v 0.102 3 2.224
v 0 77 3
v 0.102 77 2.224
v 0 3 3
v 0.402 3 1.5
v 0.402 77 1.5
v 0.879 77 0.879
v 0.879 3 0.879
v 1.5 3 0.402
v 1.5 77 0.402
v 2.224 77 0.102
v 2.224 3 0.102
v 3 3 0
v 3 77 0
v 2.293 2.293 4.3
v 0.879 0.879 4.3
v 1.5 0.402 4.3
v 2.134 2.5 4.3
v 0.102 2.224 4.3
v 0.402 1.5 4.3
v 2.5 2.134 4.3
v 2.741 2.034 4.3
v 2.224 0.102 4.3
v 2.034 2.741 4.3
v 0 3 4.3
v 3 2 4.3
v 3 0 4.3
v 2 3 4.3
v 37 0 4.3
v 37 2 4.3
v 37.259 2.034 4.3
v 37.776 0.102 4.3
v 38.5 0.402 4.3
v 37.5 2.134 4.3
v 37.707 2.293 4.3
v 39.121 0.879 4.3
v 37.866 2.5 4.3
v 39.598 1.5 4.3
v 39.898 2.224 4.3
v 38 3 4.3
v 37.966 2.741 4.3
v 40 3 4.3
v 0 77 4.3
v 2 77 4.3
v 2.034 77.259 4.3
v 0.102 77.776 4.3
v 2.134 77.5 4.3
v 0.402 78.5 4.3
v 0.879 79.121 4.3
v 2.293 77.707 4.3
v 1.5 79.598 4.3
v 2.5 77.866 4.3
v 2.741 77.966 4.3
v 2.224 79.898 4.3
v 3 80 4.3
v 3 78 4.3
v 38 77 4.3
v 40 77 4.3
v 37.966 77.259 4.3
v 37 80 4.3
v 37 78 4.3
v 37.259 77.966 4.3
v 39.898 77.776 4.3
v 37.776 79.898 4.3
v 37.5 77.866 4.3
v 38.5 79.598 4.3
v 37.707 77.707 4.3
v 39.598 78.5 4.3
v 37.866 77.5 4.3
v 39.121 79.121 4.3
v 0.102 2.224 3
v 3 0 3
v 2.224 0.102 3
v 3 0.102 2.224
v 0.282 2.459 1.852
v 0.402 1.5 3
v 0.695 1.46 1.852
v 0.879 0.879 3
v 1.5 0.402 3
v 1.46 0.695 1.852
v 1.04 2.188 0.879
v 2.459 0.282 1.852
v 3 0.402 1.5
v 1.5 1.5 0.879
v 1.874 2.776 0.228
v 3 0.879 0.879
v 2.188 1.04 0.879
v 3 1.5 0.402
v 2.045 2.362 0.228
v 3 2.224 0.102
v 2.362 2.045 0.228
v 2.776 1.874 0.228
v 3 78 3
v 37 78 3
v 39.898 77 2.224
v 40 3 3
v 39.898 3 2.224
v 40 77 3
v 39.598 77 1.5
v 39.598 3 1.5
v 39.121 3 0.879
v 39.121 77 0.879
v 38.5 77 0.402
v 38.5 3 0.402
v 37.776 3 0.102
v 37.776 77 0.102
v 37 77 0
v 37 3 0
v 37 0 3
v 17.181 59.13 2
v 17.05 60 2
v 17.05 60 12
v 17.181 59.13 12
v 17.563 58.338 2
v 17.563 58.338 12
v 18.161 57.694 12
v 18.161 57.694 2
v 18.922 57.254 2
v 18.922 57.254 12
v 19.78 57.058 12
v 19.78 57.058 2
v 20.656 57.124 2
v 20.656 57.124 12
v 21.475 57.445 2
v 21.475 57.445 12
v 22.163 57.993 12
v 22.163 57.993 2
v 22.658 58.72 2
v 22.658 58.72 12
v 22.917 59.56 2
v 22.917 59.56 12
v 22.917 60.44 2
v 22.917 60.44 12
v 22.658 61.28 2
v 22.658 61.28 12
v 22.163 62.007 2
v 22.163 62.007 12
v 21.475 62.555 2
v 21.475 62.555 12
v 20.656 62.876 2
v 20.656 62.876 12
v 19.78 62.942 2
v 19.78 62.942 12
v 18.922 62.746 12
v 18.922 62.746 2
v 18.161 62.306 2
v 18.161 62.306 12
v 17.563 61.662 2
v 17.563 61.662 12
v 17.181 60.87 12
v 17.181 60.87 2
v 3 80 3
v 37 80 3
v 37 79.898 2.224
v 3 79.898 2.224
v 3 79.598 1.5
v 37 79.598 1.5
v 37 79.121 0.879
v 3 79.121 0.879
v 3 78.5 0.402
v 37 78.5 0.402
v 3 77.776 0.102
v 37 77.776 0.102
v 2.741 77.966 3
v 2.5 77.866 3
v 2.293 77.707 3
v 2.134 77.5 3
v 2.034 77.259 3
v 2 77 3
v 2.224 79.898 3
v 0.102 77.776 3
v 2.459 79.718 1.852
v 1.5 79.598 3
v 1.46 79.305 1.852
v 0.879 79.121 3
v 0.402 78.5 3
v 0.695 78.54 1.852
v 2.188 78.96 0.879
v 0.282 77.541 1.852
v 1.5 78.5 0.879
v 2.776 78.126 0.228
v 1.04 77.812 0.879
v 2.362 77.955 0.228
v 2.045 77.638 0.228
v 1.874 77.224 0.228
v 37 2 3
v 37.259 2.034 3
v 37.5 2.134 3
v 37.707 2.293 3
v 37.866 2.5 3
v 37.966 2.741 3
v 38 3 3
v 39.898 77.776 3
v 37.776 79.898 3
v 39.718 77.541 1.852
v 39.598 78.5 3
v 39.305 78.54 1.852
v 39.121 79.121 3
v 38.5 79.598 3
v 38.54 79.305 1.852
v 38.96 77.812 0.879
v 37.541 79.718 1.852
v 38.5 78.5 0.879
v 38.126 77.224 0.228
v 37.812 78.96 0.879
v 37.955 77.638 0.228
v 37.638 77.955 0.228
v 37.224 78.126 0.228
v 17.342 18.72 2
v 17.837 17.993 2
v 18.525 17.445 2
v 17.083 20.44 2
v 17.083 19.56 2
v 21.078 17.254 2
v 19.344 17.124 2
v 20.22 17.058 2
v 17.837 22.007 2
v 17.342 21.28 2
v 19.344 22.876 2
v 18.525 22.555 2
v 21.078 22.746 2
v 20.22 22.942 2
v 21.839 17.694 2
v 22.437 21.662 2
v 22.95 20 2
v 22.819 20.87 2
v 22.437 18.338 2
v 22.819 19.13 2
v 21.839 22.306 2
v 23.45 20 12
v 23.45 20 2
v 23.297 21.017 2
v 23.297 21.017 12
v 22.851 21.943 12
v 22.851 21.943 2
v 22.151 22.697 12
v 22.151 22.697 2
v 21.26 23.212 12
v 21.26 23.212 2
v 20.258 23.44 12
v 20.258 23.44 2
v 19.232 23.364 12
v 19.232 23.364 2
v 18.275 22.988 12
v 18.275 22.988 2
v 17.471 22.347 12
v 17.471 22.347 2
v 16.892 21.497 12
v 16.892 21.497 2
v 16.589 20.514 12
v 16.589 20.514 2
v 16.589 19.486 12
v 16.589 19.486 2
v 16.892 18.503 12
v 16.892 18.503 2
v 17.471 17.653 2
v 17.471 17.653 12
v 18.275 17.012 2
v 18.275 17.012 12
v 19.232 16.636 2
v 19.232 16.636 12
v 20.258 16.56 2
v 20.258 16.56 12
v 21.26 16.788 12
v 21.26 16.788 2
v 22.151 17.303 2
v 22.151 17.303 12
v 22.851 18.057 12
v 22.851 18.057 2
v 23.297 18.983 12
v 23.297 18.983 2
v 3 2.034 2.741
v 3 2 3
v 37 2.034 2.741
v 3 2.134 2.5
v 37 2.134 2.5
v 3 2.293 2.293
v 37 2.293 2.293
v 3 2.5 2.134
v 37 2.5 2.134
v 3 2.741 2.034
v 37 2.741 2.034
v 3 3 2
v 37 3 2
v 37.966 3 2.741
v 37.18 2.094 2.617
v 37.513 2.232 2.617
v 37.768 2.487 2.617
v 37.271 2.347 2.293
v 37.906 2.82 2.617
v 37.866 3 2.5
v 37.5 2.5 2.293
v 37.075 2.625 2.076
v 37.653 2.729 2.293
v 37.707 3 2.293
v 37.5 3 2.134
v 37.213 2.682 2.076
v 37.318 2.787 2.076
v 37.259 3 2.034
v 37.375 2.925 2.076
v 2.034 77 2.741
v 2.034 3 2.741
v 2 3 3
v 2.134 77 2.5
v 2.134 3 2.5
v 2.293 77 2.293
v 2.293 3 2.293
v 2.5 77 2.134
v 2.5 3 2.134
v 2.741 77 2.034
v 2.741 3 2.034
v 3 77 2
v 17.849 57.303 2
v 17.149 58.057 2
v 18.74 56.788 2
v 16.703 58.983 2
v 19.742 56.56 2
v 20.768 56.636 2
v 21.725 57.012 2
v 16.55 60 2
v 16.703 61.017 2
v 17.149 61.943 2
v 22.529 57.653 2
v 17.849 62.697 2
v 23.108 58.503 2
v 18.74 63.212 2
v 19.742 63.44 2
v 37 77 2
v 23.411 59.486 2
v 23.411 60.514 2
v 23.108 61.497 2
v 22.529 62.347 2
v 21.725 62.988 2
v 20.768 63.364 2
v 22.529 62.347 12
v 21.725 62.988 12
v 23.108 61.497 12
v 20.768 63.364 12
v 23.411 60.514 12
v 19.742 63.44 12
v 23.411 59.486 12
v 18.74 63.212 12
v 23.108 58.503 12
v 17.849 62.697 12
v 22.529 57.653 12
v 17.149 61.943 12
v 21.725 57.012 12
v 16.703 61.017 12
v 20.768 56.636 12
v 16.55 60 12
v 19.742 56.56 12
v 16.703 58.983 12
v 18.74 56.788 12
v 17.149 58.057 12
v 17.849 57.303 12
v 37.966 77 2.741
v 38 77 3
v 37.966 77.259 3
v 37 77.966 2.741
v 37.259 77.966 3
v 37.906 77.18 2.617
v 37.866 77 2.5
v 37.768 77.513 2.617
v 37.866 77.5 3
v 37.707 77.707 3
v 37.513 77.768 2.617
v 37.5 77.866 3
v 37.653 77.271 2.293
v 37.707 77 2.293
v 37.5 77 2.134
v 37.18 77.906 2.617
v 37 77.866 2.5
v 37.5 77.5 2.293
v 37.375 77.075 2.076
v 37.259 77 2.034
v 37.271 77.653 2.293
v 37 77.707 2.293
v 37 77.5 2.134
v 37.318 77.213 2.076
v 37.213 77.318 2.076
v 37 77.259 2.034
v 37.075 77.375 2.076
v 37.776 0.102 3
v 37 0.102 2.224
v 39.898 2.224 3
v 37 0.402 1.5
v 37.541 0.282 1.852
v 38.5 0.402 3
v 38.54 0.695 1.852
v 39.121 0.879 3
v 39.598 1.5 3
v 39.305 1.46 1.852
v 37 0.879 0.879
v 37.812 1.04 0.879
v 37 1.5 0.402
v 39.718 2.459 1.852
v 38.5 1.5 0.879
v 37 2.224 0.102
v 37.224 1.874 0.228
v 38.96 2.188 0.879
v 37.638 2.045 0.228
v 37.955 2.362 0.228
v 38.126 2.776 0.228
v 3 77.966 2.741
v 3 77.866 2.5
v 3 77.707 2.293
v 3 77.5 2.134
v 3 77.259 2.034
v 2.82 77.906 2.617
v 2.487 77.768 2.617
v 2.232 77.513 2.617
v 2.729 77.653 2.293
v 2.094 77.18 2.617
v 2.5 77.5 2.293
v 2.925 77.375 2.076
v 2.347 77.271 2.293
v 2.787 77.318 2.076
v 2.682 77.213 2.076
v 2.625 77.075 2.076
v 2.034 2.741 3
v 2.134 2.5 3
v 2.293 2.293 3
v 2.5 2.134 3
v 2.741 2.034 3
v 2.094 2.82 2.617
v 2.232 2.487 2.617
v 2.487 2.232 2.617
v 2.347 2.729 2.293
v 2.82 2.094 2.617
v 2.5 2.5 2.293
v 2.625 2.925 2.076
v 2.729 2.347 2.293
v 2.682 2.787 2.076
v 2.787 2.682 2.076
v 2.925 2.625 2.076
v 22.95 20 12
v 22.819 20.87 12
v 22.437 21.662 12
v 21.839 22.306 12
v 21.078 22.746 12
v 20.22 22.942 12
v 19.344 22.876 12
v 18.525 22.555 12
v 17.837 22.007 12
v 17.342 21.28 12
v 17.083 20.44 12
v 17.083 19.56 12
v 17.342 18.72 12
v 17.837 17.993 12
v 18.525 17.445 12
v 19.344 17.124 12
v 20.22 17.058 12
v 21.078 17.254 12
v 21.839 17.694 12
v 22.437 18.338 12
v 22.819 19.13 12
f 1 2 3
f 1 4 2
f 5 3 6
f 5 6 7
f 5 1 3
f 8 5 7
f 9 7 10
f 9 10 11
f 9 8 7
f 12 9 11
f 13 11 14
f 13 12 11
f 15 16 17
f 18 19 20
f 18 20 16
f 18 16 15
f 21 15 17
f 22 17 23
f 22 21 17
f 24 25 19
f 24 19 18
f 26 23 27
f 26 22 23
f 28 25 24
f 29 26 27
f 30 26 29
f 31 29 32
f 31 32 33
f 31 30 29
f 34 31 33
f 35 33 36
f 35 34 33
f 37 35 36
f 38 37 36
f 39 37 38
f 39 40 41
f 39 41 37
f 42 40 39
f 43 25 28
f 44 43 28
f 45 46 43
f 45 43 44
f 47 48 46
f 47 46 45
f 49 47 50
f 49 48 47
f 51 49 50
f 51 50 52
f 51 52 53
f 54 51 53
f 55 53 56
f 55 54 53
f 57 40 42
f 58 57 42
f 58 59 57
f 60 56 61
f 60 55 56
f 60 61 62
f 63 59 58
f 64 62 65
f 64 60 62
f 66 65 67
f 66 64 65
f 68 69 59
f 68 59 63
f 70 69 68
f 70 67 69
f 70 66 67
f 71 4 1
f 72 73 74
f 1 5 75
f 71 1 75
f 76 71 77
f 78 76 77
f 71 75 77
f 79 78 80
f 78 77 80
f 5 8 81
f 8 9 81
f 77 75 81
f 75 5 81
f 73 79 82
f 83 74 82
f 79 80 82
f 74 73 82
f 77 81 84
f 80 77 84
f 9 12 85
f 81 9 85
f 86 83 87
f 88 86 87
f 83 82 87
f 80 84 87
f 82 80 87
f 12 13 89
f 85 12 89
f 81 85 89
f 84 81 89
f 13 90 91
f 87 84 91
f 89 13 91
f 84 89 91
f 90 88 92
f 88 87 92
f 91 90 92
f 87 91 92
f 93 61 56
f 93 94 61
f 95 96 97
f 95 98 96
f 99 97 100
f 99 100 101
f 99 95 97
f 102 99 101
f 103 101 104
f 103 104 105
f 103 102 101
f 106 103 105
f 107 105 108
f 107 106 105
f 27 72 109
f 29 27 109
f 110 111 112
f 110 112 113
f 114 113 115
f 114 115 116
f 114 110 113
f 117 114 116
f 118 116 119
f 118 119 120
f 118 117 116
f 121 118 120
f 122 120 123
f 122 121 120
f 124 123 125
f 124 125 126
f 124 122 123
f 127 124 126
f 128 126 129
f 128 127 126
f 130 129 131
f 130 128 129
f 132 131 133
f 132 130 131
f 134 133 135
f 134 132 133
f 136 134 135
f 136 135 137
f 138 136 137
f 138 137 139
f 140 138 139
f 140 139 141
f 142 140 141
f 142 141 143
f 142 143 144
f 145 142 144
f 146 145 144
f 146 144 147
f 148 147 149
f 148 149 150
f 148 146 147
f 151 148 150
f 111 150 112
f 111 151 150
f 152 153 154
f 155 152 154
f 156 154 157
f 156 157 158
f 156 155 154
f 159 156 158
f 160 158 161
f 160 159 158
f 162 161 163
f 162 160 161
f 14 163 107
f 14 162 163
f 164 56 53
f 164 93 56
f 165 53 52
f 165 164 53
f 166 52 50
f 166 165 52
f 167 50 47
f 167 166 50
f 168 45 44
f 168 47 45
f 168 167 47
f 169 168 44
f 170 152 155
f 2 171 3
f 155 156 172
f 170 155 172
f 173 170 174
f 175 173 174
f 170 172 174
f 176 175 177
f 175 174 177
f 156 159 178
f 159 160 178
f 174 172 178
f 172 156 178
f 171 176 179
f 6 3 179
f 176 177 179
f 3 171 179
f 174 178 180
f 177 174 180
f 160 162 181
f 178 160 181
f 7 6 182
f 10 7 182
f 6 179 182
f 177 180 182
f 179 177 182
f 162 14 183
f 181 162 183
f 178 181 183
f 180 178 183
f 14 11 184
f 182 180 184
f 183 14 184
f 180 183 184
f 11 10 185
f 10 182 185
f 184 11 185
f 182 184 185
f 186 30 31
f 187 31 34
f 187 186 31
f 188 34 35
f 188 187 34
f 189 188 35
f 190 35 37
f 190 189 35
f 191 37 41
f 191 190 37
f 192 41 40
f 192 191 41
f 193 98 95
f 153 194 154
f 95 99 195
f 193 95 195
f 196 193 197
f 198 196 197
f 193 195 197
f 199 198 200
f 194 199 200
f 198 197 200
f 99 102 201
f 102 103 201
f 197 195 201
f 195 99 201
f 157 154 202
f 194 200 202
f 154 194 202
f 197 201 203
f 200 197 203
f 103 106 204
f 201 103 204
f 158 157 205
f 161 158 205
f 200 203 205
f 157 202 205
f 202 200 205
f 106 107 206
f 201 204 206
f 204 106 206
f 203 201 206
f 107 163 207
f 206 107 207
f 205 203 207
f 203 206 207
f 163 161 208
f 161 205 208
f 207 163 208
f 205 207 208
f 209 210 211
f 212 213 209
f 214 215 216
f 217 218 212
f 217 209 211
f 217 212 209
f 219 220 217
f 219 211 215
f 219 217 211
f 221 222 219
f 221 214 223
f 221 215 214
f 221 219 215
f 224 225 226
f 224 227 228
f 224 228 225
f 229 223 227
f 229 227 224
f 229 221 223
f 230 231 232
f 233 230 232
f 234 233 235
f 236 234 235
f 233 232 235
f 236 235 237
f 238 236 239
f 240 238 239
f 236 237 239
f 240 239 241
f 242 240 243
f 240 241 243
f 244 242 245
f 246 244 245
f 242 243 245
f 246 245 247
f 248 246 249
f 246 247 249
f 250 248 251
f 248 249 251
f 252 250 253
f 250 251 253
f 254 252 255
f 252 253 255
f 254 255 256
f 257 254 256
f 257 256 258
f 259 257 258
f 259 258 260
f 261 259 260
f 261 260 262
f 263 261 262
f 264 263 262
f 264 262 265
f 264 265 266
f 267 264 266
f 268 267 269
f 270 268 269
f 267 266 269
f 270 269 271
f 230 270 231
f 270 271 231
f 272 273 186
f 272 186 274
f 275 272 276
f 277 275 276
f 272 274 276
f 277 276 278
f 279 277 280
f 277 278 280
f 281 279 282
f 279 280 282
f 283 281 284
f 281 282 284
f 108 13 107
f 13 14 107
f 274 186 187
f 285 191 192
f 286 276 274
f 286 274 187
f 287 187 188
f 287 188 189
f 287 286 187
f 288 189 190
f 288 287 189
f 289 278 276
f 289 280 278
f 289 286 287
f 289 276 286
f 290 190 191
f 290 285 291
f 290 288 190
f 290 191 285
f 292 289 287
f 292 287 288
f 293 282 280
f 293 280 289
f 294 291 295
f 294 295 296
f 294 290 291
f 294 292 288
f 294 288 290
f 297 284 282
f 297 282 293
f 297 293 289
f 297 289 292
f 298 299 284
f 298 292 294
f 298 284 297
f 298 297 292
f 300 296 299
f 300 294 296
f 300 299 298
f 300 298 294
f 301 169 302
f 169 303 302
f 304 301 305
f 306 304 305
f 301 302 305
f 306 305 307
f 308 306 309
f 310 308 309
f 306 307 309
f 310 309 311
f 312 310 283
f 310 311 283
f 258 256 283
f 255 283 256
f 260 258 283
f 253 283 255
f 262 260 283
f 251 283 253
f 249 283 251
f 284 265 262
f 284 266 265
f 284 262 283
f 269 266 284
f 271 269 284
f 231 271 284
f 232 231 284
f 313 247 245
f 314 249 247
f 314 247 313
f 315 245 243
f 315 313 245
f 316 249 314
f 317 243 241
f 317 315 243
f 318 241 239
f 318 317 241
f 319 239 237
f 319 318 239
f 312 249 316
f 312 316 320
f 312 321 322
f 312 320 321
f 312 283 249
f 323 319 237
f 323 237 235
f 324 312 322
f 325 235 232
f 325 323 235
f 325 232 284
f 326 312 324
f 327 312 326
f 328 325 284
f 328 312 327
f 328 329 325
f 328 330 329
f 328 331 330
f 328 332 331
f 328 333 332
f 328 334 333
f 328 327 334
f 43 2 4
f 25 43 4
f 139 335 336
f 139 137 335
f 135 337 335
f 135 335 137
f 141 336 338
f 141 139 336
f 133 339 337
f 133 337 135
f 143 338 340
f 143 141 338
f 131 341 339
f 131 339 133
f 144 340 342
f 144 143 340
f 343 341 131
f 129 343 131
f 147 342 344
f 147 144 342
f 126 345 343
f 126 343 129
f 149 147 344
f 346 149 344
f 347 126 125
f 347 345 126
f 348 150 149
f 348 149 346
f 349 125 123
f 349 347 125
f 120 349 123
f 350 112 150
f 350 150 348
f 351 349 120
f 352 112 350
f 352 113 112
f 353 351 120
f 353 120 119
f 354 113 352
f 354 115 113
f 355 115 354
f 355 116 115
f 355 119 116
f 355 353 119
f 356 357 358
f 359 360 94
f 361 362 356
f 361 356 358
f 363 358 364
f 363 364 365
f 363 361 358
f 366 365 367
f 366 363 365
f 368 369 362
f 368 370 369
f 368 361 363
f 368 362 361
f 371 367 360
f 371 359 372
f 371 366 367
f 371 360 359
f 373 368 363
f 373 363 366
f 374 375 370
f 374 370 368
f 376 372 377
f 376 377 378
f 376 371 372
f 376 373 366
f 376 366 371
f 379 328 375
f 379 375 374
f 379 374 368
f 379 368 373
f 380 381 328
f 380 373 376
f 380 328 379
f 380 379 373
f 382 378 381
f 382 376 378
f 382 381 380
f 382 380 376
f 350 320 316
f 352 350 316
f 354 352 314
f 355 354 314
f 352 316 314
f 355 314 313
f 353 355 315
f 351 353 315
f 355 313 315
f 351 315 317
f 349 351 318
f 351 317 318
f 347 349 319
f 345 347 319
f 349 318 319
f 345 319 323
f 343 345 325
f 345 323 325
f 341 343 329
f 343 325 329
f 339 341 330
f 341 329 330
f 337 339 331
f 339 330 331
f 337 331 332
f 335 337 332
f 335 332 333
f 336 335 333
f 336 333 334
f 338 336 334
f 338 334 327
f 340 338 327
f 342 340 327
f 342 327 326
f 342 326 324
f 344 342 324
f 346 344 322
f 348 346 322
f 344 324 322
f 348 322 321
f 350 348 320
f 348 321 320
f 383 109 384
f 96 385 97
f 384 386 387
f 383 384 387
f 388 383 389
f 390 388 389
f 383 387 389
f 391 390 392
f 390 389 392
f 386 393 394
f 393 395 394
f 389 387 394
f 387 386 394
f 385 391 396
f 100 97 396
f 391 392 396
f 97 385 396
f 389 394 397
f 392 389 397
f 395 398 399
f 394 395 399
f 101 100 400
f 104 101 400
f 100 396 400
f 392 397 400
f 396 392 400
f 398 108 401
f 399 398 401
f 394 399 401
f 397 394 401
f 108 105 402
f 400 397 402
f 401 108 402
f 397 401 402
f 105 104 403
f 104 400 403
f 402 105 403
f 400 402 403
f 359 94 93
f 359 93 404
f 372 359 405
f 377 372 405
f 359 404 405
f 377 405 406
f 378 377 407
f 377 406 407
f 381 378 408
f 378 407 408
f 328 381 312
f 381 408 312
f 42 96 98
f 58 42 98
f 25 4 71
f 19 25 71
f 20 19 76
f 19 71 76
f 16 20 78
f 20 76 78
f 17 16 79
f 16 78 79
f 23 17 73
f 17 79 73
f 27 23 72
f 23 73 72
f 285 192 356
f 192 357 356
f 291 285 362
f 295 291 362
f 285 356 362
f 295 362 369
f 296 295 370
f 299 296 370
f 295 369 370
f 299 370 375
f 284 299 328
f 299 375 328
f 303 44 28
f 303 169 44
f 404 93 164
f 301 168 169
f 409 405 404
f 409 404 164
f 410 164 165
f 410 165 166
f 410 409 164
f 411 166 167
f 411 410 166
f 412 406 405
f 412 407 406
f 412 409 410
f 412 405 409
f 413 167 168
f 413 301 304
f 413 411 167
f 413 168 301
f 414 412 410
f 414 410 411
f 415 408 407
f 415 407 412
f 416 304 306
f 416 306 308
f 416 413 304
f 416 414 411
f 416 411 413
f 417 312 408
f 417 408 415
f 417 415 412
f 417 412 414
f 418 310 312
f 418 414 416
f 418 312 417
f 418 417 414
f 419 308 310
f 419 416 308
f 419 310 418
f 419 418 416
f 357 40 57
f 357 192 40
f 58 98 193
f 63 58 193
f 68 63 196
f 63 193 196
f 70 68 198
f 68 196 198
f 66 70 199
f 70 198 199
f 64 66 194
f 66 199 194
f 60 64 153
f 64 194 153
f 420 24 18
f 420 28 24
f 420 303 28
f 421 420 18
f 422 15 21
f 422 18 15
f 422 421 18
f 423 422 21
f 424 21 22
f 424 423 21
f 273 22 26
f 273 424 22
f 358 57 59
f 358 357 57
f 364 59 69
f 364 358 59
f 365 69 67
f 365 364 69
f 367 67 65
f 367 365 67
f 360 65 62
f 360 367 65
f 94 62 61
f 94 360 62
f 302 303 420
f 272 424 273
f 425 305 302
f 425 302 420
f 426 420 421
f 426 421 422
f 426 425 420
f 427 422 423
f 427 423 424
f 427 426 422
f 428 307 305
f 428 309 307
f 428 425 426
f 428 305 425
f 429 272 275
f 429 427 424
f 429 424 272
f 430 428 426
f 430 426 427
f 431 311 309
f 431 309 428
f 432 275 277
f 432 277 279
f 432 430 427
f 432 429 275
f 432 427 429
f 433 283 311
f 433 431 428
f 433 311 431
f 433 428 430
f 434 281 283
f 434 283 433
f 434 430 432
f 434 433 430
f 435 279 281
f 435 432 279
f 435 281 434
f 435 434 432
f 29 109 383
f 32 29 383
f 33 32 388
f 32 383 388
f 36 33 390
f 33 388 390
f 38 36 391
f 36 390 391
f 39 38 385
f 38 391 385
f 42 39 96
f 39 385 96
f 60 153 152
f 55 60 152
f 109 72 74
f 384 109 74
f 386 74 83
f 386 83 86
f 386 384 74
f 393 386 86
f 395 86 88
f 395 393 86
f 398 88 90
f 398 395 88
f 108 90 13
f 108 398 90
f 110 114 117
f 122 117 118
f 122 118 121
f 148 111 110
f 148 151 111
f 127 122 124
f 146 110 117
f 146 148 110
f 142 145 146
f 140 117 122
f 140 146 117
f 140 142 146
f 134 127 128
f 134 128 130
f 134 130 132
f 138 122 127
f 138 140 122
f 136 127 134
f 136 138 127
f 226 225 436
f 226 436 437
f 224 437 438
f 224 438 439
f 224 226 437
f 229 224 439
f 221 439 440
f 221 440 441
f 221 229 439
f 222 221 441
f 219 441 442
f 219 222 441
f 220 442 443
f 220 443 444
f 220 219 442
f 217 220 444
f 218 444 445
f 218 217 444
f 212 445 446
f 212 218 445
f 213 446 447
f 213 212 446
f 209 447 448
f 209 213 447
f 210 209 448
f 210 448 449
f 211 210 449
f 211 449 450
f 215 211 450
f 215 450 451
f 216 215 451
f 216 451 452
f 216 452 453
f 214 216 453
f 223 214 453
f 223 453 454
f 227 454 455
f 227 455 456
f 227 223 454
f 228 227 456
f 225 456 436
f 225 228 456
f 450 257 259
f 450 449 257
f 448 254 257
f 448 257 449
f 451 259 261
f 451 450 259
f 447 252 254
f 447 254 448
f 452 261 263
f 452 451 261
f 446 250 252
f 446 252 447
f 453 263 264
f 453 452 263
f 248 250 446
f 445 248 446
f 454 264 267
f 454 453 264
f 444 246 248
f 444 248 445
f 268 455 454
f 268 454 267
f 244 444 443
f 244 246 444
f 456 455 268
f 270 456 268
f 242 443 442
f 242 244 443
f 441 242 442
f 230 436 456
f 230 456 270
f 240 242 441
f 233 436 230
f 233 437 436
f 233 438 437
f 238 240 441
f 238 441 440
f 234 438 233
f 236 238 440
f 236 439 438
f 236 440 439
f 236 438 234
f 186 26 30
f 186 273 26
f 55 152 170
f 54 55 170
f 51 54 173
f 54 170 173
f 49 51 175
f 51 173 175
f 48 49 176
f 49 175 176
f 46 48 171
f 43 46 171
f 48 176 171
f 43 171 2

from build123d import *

# Parameters (mm, degrees)
EXTRUDE_1_DEPTH = 4.3
FILLET_1_R      = 3
SHELL_1_T       = -2
SKETCH_3_R      = 3.45
SKETCH_3_R_2    = 2.95
EXTRUDE_2_DEPTH = 10


with BuildPart() as part:
    # 草图1 → 凸台-拉伸1 (new body)
    with BuildSketch(Plane.XY):
        with BuildLine():
            Line((3, 0), (37, 0))
            ThreePointArc((37, 0), (39.121320344, 0.878679656), (40, 3))
            Line((40, 3), (40, 77))
            ThreePointArc((40, 77), (39.121320344, 79.121320344), (37, 80))
            Line((37, 80), (3, 80))
            ThreePointArc((3, 80), (0.878679656, 79.121320344), (0, 77))
            Line((0, 77), (0, 3))
            ThreePointArc((0, 3), (0.878679656, 0.878679656), (3, 0))
        make_face()
    extrude(amount=EXTRUDE_1_DEPTH)

    # 圆角1
    fillet_1_edges = [part.edges().sort_by_distance(p)[0] for p in [
        (20, 0, 0),
        (0.878679656, 0.878679656, 0),
        (0, 40, 0),
        (0.878679656, 79.121320344, 0),
        (20, 80, 0),
        (39.121320344, 79.121320344, 0),
        (40, 40, 0),
        (39.121320344, 0.878679656, 0),
    ]]
    fillet(fillet_1_edges, radius=FILLET_1_R)

    # 抽壳1
    shell_1_openings = [part.faces().sort_by_distance(p)[0] for p in [
        (20, 40, 4.3),
    ]]
    offset(amount=SHELL_1_T, openings=shell_1_openings, kind=Kind.INTERSECTION)

    # 草图3 → 凸台-拉伸2 (add)
    # profile 1 of 2: a face of its own
    with BuildSketch(Plane.XY.offset(2)):
        with Locations((20, 20)):
            Circle(SKETCH_3_R)
        with Locations((20, 20)):
            Circle(SKETCH_3_R_2, mode=Mode.SUBTRACT)
    # profile 2 of 2: a face of its own
    with BuildSketch(Plane.XY.offset(2)):
        with Locations(Location((20, 60, 0), (0, 0, 180))):
            Circle(SKETCH_3_R)
        with Locations(Location((20, 60, 0), (0, 0, 180))):
            Circle(SKETCH_3_R_2, mode=Mode.SUBTRACT)
    extrude(amount=EXTRUDE_2_DEPTH)


solid = part.part
